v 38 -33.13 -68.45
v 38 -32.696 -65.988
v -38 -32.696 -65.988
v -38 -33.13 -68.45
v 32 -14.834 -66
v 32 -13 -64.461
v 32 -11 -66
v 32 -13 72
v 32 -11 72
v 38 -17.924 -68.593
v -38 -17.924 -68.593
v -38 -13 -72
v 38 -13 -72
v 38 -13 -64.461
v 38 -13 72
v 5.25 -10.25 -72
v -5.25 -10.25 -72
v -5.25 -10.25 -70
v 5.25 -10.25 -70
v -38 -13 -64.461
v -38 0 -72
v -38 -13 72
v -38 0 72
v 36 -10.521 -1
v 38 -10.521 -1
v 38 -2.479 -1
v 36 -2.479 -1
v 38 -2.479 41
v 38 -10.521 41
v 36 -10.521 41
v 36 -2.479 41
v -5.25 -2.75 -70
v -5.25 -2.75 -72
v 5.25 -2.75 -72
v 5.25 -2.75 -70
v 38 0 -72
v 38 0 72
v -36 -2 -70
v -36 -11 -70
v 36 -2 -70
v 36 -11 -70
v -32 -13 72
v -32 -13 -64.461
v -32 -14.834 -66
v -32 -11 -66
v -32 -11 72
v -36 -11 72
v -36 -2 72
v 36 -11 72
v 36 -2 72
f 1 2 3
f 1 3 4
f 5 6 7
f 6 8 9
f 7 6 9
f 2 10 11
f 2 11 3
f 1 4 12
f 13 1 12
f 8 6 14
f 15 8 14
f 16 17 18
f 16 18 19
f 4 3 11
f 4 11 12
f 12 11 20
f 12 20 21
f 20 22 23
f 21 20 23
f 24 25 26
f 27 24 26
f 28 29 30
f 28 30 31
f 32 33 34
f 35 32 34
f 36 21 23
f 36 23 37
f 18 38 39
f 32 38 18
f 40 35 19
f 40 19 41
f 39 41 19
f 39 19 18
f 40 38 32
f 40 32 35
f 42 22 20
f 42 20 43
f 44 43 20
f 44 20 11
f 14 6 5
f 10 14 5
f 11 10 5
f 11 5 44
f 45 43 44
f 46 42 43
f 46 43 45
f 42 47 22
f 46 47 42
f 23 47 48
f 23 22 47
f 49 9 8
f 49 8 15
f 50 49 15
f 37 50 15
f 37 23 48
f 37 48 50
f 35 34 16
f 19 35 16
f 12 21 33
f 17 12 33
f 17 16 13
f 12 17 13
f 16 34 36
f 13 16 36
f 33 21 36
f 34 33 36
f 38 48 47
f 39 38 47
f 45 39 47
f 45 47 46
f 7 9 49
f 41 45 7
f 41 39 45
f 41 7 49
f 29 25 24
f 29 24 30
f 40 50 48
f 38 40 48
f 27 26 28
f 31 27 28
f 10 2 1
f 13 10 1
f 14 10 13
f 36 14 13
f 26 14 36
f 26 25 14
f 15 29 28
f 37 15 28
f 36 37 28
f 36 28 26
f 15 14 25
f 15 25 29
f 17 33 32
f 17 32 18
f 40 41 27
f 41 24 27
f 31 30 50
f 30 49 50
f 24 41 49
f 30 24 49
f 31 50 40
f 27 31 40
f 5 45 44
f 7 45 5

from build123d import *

# Parameters (mm, degrees)
F0_W          = 76
F0_H          = 144
F1_DEPTH      = 13
F3_DEPTH      = 142
F4_W          = 64
F4_H          = 2
F5_DEPTH      = 4
F6_W          = 10.5
F6_H          = 7.5
F7_DEPTH      = 25
F8_W          = 8.0420786627
F8_H          = 42
F9_DEPTH      = 25
F11_DEPTH     = 76
F12_T4_DEPTH  = 76
F12_T10_DEPTH = 76
F12_T16_DEPTH = 76
F12_T23_DEPTH = 76
F12_T29_DEPTH = 76


# Not quite as in the source:
# - a fillet or chamfer that OpenCascade refuses, or shapes differently, is made with other operations: its cross-section is extruded or revolved along the edge and cut away or added


with BuildPart() as f1:
    # F0 (on Front) → F1 (new body)
    with BuildSketch(Plane.XZ):
        Rectangle(F0_W, F0_H)
    extrude(amount=F1_DEPTH)

    # F2 (on face) → F3 (cut)
    with BuildSketch(Plane.XY.offset(72)):
        Polygon((-32, -11), (-32, -13), (32, -13), (32, -11), (36, -11), (36, -2), (-36, -2), (-36, -11), align=None)
    extrude(amount=-F3_DEPTH, mode=Mode.SUBTRACT)

    # F4 (on face) → F5 (join)
    with BuildSketch(Plane.XY.offset(-70)):
        with Locations((0, -12)):
            Rectangle(F4_W, F4_H)
    extrude(amount=F5_DEPTH)

    # F6 (on face) → F7 (cut)
    with BuildSketch(Plane(origin=(0, 0, -72), x_dir=(1, 0, 0), z_dir=(0, 0, -1))):
        with Locations((0, 6.5)):
            Rectangle(F6_W, F6_H)
    extrude(amount=-F7_DEPTH, mode=Mode.SUBTRACT)

    # F8 (on face) → F9 (cut)
    with BuildSketch(Plane.YZ.offset(38)):
        with Locations((-6.5, 20)):
            Rectangle(F8_W, F8_H)
    extrude(amount=-F9_DEPTH, mode=Mode.SUBTRACT)

    # F10 (on face) → F11 (join)
    with BuildSketch(Plane.YZ.offset(38)):
        Polygon((-33.1302755044, -68.4504892995), (-13, -72), (-13, -69.4614334703), (-32.6961550602, -65.9884699169), align=None)
    extrude(amount=-F11_DEPTH)

    # F12: chamfer of 5 on 1 edges, made by hand


with BuildPart() as f12_tool2:
    # F12_s3 → F12_t4 (new body)
    with BuildSketch(Plane.YZ.offset(38)):
        Polygon((-13, -64.4614334703), (-17.9240387651, -68.593192582), (-13, -69.4614334703), align=None)
    extrude(amount=-F12_T4_DEPTH)

    split(bisect_by=Plane.XY.offset(-66), keep=Keep.TOP)

    split(bisect_by=Plane.YZ.offset(32), keep=Keep.TOP)


with BuildPart() as f1_1:
    add(f1.part)

    # F12_t1: union F12_tool2
    add(f12_tool2.part)


with BuildPart() as f12_tool8:
    # F12_s9 → F12_t10 (new body)
    with BuildSketch(Plane.YZ.offset(38)):
        Polygon((-13, -64.4614334703), (-17.9240387651, -68.593192582), (-13, -69.4614334703), align=None)
    extrude(amount=-F12_T10_DEPTH)

    split(bisect_by=Plane.XY.offset(-66), keep=Keep.BOTTOM)

    split(bisect_by=Plane.YZ.offset(32), keep=Keep.TOP)


with BuildPart() as f1_2:
    add(f1_1.part)

    # F12_t7: union F12_tool8
    add(f12_tool8.part)


with BuildPart() as f12_tool14:
    # F12_s15 → F12_t16 (new body)
    with BuildSketch(Plane.YZ.offset(38)):
        Polygon((-13, -64.4614334703), (-17.9240387651, -68.593192582), (-13, -69.4614334703), align=None)
    extrude(amount=-F12_T16_DEPTH)

    split(bisect_by=Plane.YZ.offset(-32), keep=Keep.TOP)

    split(bisect_by=Plane.XY.offset(-66), keep=Keep.BOTTOM)

    split(bisect_by=Plane.YZ.offset(32), keep=Keep.BOTTOM)


with BuildPart() as f1_3:
    add(f1_2.part)

    # F12_t13: union F12_tool14
    add(f12_tool14.part)


with BuildPart() as f12_tool21:
    # F12_s22 → F12_t23 (new body)
    with BuildSketch(Plane.YZ.offset(38)):
        Polygon((-13, -64.4614334703), (-17.9240387651, -68.593192582), (-13, -69.4614334703), align=None)
    extrude(amount=-F12_T23_DEPTH)

    split(bisect_by=Plane.YZ.offset(-32), keep=Keep.BOTTOM)

    split(bisect_by=Plane.XY.offset(-66), keep=Keep.TOP)


with BuildPart() as f1_4:
    add(f1_3.part)

    # F12_t20: union F12_tool21
    add(f12_tool21.part)


with BuildPart() as f12_tool27:
    # F12_s28 → F12_t29 (new body)
    with BuildSketch(Plane.YZ.offset(38)):
        Polygon((-13, -64.4614334703), (-17.9240387651, -68.593192582), (-13, -69.4614334703), align=None)
    extrude(amount=-F12_T29_DEPTH)

    split(bisect_by=Plane.YZ.offset(-32), keep=Keep.BOTTOM)

    split(bisect_by=Plane.XY.offset(-66), keep=Keep.BOTTOM)


with BuildPart() as f1_5:
    add(f1_4.part)

    # F12_t26: union F12_tool27
    add(f12_tool27.part)


solid = f1_5.part
